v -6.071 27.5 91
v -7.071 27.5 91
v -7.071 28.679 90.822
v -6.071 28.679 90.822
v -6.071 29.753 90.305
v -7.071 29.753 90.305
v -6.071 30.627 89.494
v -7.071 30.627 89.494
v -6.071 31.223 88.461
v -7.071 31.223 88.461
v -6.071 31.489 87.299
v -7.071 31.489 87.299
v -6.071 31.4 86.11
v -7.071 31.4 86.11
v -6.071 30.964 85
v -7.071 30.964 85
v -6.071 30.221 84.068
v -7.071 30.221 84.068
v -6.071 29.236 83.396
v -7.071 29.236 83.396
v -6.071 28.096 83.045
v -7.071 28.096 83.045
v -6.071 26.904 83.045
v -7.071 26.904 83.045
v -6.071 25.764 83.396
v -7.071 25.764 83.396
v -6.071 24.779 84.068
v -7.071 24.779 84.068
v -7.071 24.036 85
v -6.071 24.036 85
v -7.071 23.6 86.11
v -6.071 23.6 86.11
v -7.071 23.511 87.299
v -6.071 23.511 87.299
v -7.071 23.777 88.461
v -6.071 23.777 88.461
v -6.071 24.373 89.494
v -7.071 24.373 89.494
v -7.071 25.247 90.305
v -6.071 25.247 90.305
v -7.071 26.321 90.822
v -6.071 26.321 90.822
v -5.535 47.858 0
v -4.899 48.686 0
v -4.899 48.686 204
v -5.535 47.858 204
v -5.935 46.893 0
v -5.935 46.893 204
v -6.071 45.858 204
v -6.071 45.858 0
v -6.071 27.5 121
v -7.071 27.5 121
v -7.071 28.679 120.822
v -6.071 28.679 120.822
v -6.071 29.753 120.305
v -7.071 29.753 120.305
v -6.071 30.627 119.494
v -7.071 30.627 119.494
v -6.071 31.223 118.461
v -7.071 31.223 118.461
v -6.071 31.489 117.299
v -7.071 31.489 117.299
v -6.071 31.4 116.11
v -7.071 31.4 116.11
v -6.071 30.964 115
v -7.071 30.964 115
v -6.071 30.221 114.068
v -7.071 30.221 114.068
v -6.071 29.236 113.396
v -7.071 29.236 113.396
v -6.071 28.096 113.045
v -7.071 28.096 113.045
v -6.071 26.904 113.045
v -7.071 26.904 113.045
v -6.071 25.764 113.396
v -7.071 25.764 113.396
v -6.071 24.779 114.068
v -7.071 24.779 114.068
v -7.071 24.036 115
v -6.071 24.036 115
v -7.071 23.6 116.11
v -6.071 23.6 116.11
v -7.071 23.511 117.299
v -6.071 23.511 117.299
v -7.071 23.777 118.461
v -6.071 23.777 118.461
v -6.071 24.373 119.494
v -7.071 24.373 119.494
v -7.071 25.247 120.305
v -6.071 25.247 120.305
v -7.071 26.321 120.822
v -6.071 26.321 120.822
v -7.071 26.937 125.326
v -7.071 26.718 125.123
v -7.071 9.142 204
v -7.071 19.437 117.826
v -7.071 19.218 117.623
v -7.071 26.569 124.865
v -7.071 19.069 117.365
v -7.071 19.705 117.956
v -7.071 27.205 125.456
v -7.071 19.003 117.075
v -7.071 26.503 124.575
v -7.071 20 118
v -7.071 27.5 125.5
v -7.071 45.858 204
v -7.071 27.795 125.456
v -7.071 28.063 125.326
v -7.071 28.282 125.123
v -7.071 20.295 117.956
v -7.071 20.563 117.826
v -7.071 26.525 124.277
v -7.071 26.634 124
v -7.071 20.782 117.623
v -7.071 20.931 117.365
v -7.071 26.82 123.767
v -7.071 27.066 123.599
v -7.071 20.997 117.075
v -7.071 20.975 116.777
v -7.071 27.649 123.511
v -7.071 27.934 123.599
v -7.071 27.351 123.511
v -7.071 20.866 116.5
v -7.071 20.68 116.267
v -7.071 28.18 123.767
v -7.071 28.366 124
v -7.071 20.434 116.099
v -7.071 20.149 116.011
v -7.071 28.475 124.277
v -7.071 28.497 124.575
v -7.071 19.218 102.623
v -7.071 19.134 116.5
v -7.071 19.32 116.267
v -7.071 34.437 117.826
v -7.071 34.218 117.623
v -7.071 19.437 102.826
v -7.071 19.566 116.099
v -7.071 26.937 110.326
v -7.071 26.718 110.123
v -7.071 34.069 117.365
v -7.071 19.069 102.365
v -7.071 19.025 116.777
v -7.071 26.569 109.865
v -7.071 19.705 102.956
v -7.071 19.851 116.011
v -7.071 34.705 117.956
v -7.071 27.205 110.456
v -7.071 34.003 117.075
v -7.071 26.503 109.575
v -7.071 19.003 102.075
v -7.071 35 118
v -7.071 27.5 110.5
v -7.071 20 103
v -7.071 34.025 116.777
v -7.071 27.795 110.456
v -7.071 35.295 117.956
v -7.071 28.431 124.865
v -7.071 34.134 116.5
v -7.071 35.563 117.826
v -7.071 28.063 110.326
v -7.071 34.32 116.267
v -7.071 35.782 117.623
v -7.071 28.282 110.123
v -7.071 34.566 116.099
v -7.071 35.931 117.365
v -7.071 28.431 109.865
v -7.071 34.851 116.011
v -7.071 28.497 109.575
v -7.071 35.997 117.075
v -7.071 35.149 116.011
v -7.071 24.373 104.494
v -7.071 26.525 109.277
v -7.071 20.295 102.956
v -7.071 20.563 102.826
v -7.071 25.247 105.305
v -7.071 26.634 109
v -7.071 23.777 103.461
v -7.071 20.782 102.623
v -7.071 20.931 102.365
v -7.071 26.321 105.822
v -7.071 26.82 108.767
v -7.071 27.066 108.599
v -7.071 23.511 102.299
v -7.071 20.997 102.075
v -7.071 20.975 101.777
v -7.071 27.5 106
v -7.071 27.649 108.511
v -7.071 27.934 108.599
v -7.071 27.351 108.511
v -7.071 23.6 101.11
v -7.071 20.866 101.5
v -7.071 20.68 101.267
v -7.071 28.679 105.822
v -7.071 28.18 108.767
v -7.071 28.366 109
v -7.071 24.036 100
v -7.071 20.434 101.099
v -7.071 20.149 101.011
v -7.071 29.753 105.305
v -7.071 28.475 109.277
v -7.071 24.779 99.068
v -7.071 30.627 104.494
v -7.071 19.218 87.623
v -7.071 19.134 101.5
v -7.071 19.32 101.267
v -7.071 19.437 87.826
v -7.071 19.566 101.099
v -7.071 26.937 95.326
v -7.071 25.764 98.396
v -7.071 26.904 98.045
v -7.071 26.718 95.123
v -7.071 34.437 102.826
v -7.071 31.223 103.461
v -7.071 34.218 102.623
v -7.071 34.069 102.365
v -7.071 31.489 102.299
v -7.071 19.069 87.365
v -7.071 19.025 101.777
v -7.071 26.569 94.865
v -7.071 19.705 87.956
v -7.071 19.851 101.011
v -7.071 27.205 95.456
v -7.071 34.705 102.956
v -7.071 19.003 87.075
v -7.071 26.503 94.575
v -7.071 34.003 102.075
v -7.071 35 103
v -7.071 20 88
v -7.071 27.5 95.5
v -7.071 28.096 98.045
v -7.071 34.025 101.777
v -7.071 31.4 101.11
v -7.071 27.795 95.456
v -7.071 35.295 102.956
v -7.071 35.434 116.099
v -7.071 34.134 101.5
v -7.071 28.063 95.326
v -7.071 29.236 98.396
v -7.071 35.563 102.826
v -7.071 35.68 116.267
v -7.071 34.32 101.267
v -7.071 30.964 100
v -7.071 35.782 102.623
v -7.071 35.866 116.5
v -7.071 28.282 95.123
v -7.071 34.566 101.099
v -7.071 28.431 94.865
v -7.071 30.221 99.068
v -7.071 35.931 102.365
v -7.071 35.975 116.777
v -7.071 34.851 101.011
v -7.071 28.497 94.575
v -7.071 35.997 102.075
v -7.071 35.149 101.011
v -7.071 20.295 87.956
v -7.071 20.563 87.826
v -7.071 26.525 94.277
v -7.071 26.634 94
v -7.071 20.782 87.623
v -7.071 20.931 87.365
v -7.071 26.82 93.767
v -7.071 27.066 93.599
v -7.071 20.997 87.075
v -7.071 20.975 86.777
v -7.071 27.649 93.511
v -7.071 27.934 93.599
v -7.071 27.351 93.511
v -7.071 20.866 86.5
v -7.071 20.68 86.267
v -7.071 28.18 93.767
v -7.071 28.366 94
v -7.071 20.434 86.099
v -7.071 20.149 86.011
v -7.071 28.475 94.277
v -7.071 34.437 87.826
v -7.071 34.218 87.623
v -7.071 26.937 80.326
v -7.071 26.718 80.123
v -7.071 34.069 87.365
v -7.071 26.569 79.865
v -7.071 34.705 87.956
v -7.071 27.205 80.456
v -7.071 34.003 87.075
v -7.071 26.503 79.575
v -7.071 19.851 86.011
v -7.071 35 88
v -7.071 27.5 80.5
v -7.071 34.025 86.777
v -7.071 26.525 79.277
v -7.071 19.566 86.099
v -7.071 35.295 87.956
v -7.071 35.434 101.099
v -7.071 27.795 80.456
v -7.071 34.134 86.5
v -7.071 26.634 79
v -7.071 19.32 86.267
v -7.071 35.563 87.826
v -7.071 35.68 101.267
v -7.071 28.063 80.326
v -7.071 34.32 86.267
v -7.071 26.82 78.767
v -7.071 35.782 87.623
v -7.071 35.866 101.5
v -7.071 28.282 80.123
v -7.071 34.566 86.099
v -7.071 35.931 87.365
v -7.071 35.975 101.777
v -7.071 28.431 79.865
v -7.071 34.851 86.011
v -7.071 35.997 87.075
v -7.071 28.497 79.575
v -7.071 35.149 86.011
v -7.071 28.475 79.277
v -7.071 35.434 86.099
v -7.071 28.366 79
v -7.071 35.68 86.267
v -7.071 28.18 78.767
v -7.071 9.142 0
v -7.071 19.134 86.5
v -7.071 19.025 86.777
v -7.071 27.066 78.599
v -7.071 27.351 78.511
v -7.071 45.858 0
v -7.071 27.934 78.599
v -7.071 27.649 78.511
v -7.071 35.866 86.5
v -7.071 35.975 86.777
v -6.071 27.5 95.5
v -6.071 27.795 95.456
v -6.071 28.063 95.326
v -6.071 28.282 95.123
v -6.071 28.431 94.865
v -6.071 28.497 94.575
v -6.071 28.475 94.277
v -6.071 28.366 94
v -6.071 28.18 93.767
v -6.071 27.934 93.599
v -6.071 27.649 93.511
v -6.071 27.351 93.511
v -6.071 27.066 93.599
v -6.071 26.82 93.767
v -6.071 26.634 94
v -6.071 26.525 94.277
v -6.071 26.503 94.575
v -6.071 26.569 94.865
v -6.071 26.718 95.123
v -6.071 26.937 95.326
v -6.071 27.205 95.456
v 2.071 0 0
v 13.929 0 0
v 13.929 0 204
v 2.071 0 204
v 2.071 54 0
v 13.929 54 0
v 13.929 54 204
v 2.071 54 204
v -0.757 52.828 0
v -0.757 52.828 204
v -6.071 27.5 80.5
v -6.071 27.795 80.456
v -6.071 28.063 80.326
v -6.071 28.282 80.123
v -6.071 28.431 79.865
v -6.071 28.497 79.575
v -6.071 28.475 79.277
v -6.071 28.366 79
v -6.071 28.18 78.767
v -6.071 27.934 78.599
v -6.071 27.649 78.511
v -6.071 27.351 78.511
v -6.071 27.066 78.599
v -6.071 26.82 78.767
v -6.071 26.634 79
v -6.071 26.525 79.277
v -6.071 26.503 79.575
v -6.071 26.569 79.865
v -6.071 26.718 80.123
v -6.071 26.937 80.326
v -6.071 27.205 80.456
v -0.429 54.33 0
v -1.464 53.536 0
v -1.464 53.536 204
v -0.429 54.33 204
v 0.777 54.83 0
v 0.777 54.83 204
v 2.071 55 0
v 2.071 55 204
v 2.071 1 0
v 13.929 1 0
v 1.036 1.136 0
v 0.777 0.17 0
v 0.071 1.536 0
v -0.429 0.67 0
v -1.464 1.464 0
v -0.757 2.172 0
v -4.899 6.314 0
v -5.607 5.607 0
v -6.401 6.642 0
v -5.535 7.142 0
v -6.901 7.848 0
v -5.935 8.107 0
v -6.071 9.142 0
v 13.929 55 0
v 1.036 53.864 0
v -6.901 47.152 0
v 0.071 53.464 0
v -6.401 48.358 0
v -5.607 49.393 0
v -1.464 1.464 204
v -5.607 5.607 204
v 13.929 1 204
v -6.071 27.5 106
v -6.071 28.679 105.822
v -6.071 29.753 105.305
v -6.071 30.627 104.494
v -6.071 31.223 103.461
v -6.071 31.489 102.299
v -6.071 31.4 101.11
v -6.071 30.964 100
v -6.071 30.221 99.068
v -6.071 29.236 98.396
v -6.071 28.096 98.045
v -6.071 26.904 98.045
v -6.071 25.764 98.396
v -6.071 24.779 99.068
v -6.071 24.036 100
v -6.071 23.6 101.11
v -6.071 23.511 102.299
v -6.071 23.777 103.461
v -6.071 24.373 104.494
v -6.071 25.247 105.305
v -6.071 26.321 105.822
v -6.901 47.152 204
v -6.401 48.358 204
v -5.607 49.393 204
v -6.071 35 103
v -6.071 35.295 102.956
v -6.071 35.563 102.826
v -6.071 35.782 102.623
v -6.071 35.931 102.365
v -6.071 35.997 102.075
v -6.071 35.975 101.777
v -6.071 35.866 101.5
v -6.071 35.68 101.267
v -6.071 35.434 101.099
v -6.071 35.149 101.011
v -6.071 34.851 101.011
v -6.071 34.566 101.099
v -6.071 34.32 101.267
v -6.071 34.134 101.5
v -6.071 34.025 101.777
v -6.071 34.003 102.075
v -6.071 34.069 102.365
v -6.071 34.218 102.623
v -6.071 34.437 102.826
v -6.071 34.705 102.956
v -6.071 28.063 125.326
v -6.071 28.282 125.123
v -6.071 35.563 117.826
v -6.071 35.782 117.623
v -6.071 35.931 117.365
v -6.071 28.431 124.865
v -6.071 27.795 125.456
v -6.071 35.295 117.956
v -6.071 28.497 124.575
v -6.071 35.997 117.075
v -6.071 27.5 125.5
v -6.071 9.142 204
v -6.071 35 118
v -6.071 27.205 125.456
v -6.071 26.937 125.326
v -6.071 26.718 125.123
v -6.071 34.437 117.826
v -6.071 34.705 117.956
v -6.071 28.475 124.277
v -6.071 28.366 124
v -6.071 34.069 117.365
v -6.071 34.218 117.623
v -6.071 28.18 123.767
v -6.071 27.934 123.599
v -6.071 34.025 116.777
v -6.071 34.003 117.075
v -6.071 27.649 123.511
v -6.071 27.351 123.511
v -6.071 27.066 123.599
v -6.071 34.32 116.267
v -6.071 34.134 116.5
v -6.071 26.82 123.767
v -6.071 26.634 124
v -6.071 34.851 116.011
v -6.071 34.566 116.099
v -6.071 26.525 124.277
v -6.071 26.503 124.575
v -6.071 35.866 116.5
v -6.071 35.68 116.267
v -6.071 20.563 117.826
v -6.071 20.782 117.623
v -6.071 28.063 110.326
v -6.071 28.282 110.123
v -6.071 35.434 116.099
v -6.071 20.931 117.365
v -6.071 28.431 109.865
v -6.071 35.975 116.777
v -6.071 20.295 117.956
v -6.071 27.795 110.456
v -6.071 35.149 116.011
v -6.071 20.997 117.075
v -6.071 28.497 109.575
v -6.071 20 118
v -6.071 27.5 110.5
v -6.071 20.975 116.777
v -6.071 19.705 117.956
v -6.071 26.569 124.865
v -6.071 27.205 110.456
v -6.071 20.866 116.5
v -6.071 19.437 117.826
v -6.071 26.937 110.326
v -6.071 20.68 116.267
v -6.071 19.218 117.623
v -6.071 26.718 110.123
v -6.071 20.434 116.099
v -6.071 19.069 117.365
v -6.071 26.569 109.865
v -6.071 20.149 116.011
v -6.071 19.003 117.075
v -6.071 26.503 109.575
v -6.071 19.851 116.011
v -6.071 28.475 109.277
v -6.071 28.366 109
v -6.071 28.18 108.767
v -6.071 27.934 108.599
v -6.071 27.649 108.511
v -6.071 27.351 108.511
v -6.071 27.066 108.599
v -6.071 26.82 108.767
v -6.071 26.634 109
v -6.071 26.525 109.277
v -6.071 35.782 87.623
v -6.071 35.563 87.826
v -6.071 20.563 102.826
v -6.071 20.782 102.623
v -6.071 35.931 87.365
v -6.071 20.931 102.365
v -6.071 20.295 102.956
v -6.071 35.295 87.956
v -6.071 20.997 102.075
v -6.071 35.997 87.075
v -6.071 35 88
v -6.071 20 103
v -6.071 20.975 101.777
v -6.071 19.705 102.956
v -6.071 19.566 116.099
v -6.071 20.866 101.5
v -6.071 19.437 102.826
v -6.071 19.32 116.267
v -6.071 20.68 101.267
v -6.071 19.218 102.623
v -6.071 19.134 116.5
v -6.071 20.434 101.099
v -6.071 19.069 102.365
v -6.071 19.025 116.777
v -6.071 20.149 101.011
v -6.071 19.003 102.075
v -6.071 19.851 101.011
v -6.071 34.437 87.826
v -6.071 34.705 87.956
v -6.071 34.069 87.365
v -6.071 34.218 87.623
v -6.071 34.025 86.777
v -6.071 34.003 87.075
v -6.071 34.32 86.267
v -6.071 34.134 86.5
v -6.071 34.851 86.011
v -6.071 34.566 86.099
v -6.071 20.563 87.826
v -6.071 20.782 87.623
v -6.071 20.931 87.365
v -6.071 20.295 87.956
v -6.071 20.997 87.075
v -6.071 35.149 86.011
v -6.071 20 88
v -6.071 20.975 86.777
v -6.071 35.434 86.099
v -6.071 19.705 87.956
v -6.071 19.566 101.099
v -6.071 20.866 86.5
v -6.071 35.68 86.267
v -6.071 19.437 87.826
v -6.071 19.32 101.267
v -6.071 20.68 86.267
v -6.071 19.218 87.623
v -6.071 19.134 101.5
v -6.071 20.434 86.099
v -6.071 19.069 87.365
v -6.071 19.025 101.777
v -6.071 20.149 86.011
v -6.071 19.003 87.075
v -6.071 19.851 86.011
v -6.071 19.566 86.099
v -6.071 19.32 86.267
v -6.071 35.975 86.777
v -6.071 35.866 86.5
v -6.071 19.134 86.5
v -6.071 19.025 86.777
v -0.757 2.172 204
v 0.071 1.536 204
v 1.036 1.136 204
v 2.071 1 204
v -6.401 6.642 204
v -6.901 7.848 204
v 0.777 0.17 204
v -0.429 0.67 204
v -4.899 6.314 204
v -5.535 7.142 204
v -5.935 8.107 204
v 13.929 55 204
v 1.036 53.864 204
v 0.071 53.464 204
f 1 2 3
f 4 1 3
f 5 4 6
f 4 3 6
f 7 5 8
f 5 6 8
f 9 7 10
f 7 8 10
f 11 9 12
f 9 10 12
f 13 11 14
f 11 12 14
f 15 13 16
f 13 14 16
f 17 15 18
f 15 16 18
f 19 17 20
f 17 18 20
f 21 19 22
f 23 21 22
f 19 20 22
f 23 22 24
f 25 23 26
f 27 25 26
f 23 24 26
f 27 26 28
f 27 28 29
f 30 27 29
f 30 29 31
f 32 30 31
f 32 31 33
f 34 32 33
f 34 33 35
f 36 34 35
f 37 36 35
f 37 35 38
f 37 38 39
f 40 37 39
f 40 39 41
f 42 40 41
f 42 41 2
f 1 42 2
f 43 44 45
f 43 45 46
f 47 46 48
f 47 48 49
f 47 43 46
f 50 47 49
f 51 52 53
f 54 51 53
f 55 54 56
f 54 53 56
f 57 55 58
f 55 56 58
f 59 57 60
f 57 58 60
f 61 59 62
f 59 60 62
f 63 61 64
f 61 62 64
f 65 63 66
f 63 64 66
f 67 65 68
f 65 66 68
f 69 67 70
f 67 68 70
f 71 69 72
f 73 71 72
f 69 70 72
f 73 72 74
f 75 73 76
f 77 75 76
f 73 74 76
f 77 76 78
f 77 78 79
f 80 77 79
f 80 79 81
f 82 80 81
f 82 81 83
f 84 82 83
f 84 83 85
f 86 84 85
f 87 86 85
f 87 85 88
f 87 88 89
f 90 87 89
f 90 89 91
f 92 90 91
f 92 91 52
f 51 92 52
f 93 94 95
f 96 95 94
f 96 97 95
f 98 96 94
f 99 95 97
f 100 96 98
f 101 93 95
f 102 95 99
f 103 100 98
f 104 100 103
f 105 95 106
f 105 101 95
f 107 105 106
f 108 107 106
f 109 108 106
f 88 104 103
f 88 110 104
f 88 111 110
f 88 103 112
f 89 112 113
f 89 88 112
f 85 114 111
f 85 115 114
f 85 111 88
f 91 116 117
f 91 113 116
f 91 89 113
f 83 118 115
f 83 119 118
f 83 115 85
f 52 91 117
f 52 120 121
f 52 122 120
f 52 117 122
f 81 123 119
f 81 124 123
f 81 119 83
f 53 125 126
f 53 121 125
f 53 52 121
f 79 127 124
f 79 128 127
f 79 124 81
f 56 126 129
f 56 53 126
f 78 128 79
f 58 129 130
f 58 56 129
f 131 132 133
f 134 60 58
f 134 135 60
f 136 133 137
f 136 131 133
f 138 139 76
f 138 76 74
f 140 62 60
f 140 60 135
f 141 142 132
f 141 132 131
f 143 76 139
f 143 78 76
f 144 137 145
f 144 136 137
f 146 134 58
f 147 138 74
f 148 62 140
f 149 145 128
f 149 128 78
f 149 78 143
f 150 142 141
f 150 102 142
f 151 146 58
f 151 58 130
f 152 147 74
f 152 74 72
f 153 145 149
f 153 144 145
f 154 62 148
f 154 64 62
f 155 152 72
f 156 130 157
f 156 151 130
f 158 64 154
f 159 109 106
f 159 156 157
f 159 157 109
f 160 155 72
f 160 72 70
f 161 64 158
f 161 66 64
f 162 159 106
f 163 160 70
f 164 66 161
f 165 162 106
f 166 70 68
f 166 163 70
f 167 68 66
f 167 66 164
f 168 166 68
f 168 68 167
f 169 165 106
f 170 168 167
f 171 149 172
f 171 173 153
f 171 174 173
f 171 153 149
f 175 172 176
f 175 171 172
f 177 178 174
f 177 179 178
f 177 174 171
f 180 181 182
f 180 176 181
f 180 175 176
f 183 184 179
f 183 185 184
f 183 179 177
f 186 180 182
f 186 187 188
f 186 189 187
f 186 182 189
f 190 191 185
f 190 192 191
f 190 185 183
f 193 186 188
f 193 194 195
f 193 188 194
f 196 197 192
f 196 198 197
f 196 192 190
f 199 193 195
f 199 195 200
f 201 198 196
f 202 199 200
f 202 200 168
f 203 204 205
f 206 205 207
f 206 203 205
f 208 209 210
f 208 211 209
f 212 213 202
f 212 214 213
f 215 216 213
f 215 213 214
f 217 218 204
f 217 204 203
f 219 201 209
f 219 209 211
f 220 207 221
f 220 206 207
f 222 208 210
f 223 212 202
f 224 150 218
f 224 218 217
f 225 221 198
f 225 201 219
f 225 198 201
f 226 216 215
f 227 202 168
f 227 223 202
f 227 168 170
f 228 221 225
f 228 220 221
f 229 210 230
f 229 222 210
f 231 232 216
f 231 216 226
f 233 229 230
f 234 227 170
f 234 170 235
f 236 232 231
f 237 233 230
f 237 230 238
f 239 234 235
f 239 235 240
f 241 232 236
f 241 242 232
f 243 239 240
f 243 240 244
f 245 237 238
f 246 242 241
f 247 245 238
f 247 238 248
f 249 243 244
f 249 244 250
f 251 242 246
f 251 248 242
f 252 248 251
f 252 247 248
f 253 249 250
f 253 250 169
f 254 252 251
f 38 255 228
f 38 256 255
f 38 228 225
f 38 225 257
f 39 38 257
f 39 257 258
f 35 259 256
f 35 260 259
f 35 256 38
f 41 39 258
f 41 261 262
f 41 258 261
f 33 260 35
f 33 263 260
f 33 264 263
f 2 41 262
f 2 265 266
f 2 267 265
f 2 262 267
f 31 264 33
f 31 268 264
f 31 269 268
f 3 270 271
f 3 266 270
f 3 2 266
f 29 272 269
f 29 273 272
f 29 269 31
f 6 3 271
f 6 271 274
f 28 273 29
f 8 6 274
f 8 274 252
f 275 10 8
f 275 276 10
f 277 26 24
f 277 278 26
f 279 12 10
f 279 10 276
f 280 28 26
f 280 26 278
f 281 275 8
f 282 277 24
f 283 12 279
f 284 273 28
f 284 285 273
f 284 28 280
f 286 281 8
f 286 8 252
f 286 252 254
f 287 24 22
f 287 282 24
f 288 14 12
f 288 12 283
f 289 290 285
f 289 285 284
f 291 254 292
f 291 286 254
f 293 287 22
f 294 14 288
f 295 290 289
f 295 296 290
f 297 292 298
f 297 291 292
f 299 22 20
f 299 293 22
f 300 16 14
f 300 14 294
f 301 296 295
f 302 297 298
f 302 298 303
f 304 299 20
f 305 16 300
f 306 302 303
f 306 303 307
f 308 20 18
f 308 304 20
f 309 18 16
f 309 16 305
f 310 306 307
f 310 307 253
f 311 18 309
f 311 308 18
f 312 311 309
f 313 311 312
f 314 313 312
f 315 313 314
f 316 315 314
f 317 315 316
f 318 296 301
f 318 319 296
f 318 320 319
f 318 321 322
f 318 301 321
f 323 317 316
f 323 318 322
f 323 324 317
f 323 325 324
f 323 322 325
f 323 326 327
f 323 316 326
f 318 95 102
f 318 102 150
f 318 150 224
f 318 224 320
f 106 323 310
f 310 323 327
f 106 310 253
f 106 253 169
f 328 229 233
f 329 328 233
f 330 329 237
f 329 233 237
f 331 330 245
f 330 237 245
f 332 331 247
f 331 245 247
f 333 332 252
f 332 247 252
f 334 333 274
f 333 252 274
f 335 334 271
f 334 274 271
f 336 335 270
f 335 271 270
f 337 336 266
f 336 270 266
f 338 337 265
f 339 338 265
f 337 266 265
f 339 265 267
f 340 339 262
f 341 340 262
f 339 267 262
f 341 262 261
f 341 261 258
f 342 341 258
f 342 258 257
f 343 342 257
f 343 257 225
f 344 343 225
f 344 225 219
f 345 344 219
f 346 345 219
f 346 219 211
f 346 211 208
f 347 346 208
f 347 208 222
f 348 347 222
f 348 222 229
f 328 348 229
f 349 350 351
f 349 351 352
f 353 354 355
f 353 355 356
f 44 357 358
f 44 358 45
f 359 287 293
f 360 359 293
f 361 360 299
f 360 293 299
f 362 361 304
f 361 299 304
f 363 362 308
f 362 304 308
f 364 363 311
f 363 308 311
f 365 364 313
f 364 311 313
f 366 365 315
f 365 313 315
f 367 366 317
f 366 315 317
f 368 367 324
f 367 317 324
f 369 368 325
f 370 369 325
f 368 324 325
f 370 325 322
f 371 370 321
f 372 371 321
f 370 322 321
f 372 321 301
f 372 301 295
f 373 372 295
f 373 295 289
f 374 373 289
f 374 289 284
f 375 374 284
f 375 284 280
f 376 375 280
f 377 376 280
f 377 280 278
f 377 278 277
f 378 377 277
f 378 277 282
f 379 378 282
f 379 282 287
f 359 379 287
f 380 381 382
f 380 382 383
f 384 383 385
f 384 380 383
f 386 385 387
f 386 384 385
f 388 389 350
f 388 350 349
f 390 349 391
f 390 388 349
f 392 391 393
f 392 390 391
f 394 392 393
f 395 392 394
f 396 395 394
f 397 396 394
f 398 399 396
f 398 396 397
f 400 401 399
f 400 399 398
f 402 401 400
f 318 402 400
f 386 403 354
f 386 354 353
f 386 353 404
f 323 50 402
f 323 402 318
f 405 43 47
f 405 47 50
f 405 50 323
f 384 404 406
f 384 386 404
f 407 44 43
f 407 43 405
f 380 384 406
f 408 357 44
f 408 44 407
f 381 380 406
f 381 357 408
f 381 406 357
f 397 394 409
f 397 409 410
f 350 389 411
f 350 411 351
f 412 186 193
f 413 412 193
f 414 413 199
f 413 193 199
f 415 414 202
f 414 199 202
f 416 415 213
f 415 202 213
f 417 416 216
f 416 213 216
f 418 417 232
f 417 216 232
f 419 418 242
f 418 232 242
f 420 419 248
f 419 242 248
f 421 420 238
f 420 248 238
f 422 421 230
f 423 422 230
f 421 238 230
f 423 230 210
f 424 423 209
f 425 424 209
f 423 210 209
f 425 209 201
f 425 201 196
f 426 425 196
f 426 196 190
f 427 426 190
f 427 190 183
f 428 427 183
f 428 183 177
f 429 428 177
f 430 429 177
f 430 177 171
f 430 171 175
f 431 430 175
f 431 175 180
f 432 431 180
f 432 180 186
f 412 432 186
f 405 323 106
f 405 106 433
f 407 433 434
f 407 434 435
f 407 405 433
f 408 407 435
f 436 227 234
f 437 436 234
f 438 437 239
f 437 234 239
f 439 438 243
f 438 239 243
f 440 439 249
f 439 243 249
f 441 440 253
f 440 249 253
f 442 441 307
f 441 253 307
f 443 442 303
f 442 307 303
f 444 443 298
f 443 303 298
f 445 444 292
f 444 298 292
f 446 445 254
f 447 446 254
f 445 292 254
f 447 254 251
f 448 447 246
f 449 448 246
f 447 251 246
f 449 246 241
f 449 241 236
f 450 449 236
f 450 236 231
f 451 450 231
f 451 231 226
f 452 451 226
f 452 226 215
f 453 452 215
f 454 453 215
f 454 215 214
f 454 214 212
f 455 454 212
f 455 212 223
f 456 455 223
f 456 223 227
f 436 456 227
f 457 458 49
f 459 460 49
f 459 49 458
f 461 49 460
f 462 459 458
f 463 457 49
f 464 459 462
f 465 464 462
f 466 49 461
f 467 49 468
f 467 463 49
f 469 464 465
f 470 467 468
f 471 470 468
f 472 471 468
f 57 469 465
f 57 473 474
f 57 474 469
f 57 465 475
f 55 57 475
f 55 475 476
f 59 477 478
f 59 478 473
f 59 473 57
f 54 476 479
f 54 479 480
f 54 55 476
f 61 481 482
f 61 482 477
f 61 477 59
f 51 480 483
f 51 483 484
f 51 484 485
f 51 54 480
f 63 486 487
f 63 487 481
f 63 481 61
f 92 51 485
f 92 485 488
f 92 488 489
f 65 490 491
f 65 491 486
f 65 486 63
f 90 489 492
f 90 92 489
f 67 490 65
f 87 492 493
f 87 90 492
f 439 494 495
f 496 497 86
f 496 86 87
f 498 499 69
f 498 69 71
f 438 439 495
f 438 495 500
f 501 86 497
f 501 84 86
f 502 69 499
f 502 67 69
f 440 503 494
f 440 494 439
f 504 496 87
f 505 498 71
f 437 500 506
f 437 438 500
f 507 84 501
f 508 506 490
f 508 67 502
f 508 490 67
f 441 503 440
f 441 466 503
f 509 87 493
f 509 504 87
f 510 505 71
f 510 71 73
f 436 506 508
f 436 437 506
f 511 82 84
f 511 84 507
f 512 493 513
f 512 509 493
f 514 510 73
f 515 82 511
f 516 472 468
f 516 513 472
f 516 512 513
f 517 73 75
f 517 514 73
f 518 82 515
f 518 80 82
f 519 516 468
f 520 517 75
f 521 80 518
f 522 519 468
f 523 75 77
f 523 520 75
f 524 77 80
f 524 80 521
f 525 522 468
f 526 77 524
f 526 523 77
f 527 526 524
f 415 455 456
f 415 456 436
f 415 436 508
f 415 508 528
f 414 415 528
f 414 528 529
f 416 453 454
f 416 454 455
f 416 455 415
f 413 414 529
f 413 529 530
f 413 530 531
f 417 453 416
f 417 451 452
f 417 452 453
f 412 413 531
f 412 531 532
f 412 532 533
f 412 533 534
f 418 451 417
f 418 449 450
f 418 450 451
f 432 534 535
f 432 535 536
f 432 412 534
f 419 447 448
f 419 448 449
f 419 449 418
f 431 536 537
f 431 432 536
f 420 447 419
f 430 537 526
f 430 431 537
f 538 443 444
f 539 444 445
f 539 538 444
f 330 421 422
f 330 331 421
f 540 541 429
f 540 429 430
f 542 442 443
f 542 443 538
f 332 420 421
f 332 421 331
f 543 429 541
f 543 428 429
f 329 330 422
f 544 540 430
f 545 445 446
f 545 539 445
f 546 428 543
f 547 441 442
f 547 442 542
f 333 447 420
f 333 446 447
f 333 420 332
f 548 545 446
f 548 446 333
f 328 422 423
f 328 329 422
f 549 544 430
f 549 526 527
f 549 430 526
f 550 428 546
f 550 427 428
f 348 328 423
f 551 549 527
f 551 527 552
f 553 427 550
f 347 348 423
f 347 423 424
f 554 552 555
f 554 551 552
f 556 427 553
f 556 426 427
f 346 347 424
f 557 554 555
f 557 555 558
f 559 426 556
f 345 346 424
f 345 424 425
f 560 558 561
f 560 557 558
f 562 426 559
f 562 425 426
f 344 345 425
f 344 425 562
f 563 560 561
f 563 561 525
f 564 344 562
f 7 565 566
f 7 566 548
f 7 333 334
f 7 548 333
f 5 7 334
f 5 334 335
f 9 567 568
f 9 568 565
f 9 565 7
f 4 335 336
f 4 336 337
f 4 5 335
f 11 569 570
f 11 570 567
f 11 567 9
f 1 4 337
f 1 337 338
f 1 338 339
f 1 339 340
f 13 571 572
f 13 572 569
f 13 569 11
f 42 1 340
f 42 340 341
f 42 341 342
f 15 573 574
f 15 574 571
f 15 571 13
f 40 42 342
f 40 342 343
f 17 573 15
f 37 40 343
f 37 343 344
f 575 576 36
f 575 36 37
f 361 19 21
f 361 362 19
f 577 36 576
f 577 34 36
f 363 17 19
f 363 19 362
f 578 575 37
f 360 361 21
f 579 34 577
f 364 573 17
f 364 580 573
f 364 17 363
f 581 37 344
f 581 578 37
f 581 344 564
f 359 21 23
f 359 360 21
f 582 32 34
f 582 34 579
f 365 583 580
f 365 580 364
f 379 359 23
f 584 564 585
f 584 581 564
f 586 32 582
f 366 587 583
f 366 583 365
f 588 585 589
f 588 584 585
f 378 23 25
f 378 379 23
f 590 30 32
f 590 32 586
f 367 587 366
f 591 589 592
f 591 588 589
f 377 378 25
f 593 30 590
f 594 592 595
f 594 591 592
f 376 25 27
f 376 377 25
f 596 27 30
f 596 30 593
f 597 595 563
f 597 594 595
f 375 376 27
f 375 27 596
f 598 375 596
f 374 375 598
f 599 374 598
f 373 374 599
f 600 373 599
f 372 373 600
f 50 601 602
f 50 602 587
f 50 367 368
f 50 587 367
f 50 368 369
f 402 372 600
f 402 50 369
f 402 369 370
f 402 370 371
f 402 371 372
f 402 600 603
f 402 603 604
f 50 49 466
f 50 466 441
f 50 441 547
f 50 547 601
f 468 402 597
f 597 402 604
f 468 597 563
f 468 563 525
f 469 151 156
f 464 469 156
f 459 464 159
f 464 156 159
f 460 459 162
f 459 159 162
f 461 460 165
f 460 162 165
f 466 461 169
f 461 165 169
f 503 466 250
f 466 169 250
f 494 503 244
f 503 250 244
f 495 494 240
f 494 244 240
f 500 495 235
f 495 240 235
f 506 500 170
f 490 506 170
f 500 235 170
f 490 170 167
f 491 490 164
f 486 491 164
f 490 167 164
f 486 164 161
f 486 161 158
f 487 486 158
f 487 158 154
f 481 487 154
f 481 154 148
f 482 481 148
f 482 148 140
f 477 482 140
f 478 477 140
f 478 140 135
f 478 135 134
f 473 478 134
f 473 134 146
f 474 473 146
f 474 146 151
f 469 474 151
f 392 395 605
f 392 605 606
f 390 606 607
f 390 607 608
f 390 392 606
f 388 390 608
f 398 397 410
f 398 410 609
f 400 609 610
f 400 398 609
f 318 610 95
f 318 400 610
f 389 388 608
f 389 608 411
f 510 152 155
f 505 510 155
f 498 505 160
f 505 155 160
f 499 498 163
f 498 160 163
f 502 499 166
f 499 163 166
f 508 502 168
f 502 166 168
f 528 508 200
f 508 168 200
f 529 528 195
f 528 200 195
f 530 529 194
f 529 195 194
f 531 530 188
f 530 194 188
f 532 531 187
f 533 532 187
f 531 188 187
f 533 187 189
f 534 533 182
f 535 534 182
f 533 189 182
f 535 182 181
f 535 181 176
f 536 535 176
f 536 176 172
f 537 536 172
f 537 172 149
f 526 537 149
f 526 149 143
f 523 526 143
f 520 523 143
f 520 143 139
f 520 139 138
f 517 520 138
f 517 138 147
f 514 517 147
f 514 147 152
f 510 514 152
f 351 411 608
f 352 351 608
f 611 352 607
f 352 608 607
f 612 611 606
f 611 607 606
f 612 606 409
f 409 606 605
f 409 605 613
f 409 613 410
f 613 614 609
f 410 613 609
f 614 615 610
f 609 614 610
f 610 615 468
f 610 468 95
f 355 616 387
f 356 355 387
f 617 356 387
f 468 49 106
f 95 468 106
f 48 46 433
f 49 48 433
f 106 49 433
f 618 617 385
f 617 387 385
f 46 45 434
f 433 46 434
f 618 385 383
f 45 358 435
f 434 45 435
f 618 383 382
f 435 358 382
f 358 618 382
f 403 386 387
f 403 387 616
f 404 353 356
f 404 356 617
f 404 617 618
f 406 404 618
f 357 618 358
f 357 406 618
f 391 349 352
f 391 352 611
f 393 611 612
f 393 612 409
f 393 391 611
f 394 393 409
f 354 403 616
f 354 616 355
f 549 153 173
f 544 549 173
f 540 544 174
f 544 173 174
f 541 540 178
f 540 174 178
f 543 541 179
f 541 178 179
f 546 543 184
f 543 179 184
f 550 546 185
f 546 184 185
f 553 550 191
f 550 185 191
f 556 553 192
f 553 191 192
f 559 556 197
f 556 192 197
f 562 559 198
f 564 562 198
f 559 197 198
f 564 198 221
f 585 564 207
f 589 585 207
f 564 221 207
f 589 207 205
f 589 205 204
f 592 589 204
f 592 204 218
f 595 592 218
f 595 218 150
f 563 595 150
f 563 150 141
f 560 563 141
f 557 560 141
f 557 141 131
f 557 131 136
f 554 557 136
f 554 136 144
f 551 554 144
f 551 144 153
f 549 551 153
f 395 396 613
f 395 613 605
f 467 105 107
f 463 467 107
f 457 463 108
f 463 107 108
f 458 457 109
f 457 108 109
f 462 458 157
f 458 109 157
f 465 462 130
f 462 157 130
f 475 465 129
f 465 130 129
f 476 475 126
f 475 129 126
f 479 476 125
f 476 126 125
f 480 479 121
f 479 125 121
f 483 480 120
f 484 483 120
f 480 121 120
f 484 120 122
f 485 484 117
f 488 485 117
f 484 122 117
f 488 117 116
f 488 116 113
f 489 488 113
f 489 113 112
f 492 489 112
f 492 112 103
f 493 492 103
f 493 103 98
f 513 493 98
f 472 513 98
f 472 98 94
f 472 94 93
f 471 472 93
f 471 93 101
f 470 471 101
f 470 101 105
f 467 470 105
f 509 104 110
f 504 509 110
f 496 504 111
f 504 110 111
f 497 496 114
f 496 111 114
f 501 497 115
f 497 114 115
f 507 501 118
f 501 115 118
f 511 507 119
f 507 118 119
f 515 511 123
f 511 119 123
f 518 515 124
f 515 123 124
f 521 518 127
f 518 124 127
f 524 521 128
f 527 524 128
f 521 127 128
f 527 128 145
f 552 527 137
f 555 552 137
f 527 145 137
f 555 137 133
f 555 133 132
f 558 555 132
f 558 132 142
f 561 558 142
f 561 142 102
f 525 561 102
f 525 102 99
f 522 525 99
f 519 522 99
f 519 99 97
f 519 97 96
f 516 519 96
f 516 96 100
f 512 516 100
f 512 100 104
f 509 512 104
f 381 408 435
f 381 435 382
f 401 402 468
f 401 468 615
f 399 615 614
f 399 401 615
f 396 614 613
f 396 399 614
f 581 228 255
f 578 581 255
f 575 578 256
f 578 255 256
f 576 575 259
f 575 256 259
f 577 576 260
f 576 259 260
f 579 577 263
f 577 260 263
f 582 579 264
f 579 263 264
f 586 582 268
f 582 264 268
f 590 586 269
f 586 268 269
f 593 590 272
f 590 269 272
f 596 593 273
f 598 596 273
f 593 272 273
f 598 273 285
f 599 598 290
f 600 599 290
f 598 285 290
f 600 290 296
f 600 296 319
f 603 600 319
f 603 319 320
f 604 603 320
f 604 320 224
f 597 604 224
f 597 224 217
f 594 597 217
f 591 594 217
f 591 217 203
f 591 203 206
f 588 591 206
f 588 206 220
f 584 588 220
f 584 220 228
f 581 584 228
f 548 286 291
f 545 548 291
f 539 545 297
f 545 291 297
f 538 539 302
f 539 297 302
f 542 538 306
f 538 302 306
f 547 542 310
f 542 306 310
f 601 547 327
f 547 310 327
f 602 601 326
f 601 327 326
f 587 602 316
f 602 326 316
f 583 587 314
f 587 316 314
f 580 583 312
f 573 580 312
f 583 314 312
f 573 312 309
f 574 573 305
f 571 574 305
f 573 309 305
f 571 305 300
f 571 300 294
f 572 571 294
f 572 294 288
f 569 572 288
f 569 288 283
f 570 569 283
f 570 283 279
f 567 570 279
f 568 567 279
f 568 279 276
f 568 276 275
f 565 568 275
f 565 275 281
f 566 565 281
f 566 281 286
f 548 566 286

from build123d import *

# Parameters (mm, degrees)
BOSS_EXTRU_1_DEPTH      = 204
ESQUISSE2_R             = 4
ESQUISSE2_R_2           = 1
ENL_V_MAT_EXTRU_1_DEPTH = 22


with BuildPart() as part:
    # Esquisse1 → Boss.-Extru.1 (new body)
    with BuildSketch(Plane.XY):
        with BuildLine():
            Line((-1.464466094, 1.464466094), (-5.606601718, 5.606601718))
            ThreePointArc((-5.606601718, 5.606601718), (-6.690465474, 7.228718462), (-7.071067812, 9.142135624))
            Line((-7.071067812, 9.142135624), (-7.071067812, 45.857864376))
            ThreePointArc((-7.071067812, 45.857864376), (-6.690465474, 47.771281538), (-5.606601718, 49.393398282))
            Line((-5.606601718, 49.393398282), (-1.464466094, 53.535533906))
            ThreePointArc((-1.464466094, 53.535533906), (0.15765065, 54.619397663), (2.071067812, 55))
            Line((2.071067812, 55), (13.928932188, 55))
            Line((13.928932188, 55), (13.928932188, 54))
            Line((13.928932188, 54), (2.071067812, 54))
            ThreePointArc((2.071067812, 54), (0.540334082, 53.69551813), (-0.757359313, 52.828427125))
            Line((-0.757359313, 52.828427125), (-4.899494937, 48.686291501))
            ThreePointArc((-4.899494937, 48.686291501), (-5.766585942, 47.388598106), (-6.071067812, 45.857864376))
            Line((-6.071067812, 45.857864376), (-6.071067812, 9.142135624))
            ThreePointArc((-6.071067812, 9.142135624), (-5.766585942, 7.611401894), (-4.899494937, 6.313708499))
            Line((-4.899494937, 6.313708499), (-0.757359313, 2.171572875))
            ThreePointArc((-0.757359313, 2.171572875), (0.540334082, 1.30448187), (2.071067812, 1))
            Line((2.071067812, 1), (13.928932188, 1))
            Line((13.928932188, 1), (13.928932188, 0))
            Line((13.928932188, 0), (2.071067812, 0))
            ThreePointArc((2.071067812, 0), (0.15765065, 0.380602337), (-1.464466094, 1.464466094))
        make_face()
    extrude(amount=BOSS_EXTRU_1_DEPTH)

    # Esquisse2 → Enlèv. mat.-Extru.1 (cut, through all)
    with BuildSketch(Plane.ZY.offset(7.071067812)):
        with Locations((102, 27.5)):
            Circle(ESQUISSE2_R)
        with Locations((102, 35)):
            Circle(ESQUISSE2_R_2)
        with Locations((109.5, 27.5)):
            Circle(ESQUISSE2_R_2)
        with Locations((102, 20)):
            Circle(ESQUISSE2_R_2)
        with Locations((94.5, 27.5)):
            Circle(ESQUISSE2_R_2)
        with Locations((117, 27.5)):
            Circle(ESQUISSE2_R)
        with Locations((117, 35)):
            Circle(ESQUISSE2_R_2)
        with Locations((124.5, 27.5)):
            Circle(ESQUISSE2_R_2)
        with Locations((117, 20)):
            Circle(ESQUISSE2_R_2)
        with Locations((87, 27.5)):
            Circle(ESQUISSE2_R)
        with Locations((87, 35)):
            Circle(ESQUISSE2_R_2)
        with Locations((87, 20)):
            Circle(ESQUISSE2_R_2)
        with Locations((79.5, 27.5)):
            Circle(ESQUISSE2_R_2)
    extrude(amount=-ENL_V_MAT_EXTRU_1_DEPTH, mode=Mode.SUBTRACT)


solid = part.part
